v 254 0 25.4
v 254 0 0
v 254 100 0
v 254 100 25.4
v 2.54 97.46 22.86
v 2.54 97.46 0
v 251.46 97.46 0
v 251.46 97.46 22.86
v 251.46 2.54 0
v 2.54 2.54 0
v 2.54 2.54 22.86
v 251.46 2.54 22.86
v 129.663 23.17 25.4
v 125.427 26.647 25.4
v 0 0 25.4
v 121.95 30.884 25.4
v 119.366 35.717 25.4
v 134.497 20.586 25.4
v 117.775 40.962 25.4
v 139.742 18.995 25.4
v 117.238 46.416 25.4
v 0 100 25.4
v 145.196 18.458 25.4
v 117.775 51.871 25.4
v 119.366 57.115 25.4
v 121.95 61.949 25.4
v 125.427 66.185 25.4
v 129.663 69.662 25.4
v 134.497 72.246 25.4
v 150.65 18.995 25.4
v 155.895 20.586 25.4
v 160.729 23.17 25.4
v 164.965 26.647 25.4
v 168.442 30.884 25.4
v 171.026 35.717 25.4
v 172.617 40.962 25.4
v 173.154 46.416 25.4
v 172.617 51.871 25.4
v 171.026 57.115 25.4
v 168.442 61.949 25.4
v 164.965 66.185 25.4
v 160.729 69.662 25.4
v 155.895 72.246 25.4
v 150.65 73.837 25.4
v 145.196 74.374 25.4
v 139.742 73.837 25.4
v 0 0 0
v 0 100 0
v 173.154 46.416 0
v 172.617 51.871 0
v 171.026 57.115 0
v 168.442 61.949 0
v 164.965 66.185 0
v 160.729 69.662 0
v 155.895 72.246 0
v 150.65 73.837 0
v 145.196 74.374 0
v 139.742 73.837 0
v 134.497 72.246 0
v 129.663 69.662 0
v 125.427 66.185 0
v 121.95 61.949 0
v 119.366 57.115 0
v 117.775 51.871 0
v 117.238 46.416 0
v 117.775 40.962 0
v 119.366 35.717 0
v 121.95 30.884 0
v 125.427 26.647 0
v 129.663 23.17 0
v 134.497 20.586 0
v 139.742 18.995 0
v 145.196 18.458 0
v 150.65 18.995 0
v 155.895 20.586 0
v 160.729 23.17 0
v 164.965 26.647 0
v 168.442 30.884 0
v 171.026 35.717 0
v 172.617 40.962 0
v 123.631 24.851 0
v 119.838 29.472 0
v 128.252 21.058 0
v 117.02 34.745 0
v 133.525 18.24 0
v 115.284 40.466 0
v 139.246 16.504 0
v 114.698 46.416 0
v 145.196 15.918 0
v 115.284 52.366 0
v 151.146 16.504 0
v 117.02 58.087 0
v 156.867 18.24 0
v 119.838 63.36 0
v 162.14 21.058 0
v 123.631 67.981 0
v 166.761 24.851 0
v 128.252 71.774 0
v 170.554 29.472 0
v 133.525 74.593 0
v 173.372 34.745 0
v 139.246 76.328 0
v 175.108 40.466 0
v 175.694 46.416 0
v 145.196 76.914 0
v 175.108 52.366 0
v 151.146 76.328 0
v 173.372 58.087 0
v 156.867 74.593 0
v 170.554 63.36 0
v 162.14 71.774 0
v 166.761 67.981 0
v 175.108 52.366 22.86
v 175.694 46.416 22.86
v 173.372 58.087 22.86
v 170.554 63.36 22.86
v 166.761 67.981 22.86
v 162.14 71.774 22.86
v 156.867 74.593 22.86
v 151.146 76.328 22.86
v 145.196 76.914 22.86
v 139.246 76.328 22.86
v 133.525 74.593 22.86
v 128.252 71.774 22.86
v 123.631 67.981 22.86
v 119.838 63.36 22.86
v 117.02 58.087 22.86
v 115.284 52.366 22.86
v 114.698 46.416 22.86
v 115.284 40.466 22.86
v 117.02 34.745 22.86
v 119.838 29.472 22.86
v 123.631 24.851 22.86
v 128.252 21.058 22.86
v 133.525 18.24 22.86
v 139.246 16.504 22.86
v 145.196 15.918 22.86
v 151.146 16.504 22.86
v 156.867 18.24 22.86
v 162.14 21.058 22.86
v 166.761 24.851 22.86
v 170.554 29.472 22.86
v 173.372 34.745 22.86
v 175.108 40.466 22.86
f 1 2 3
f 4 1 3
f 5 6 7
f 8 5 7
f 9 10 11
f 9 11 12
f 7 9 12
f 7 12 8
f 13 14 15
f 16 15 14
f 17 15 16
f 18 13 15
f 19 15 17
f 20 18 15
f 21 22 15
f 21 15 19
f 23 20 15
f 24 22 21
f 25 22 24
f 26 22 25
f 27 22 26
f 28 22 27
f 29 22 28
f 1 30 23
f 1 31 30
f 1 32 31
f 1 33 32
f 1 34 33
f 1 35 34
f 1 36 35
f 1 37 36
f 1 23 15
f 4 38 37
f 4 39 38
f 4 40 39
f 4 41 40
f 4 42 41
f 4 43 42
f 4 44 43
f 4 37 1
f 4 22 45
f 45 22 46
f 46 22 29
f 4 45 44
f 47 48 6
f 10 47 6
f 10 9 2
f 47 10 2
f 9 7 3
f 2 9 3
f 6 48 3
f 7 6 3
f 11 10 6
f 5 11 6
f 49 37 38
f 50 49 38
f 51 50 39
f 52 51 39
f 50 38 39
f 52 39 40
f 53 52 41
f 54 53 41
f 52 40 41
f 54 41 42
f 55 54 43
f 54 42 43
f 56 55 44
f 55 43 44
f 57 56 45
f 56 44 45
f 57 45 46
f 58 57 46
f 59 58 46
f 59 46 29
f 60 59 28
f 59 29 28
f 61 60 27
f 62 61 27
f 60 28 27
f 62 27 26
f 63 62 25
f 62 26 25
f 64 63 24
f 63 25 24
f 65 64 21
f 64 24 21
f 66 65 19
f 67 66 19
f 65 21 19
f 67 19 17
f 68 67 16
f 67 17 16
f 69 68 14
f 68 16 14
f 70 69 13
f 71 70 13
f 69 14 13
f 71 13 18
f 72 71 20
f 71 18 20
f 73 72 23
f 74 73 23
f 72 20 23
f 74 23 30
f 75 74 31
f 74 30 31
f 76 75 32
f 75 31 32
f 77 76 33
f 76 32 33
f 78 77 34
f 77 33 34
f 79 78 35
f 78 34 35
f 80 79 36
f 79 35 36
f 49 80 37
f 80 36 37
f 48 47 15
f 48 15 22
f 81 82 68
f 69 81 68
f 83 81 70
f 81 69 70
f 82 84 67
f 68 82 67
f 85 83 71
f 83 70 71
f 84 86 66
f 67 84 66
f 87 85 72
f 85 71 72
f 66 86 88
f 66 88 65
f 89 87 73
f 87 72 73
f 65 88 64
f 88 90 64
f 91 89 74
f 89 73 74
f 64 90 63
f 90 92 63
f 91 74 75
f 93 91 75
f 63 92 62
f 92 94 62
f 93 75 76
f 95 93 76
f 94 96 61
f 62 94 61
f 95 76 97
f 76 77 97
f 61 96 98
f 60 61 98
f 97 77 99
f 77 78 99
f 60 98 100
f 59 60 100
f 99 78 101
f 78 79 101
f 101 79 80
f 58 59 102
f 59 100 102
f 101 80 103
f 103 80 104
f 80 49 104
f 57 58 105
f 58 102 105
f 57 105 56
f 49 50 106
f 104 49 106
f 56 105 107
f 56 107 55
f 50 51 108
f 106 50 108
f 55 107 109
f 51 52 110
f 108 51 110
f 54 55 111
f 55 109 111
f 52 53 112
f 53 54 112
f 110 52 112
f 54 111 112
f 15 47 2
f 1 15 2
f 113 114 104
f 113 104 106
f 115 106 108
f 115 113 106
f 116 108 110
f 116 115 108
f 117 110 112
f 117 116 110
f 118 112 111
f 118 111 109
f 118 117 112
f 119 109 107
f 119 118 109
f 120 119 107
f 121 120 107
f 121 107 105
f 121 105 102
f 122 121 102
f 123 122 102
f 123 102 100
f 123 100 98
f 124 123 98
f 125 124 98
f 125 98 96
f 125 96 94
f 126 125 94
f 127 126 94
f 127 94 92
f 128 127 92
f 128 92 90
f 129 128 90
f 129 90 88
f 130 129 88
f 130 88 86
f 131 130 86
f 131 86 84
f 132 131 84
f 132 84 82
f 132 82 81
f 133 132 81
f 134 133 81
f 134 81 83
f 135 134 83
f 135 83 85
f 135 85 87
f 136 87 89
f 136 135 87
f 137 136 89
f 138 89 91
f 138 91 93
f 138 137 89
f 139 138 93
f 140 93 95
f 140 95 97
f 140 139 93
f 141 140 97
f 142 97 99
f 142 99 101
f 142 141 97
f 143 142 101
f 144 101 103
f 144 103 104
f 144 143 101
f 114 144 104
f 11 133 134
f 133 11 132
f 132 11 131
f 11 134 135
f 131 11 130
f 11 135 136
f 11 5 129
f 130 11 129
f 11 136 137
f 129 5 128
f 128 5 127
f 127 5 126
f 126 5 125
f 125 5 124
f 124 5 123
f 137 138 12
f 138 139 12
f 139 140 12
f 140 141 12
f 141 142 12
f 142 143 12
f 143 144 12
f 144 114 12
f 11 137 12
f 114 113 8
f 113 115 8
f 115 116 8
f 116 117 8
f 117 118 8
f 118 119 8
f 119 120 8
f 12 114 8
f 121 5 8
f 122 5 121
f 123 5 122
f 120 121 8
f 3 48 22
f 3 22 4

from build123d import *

# Parameters (mm, degrees)
F0_W     = 254
F0_H     = 100
F1_DEPTH = 25.4
F2_W     = 254
F2_H     = 100
F2_R     = 27.9579286296
F3_DEPTH = 25.4
F4_T     = -2.54


with BuildPart() as f1:
    # F0 (on Top) → F1 (new body)
    with BuildSketch(Plane.XY):
        with Locations((127, 50)):
            Rectangle(F0_W, F0_H)
    extrude(amount=F1_DEPTH)

    # F2 (on face) → F3 (intersect)
    with BuildSketch(Plane.XY.offset(25.4)):
        with Locations((127, 50)):
            Rectangle(F2_W, F2_H)
        with Locations((145.1960504055, 46.4161895216)):
            Circle(F2_R, mode=Mode.SUBTRACT)
    extrude(amount=-F3_DEPTH, mode=Mode.INTERSECT)

    # F4
    f4_openings = [f1.faces().sort_by_distance(p)[0] for p in [
        (2.729762, 50, 0),
    ]]
    offset(amount=F4_T, openings=f4_openings)


solid = f1.part
